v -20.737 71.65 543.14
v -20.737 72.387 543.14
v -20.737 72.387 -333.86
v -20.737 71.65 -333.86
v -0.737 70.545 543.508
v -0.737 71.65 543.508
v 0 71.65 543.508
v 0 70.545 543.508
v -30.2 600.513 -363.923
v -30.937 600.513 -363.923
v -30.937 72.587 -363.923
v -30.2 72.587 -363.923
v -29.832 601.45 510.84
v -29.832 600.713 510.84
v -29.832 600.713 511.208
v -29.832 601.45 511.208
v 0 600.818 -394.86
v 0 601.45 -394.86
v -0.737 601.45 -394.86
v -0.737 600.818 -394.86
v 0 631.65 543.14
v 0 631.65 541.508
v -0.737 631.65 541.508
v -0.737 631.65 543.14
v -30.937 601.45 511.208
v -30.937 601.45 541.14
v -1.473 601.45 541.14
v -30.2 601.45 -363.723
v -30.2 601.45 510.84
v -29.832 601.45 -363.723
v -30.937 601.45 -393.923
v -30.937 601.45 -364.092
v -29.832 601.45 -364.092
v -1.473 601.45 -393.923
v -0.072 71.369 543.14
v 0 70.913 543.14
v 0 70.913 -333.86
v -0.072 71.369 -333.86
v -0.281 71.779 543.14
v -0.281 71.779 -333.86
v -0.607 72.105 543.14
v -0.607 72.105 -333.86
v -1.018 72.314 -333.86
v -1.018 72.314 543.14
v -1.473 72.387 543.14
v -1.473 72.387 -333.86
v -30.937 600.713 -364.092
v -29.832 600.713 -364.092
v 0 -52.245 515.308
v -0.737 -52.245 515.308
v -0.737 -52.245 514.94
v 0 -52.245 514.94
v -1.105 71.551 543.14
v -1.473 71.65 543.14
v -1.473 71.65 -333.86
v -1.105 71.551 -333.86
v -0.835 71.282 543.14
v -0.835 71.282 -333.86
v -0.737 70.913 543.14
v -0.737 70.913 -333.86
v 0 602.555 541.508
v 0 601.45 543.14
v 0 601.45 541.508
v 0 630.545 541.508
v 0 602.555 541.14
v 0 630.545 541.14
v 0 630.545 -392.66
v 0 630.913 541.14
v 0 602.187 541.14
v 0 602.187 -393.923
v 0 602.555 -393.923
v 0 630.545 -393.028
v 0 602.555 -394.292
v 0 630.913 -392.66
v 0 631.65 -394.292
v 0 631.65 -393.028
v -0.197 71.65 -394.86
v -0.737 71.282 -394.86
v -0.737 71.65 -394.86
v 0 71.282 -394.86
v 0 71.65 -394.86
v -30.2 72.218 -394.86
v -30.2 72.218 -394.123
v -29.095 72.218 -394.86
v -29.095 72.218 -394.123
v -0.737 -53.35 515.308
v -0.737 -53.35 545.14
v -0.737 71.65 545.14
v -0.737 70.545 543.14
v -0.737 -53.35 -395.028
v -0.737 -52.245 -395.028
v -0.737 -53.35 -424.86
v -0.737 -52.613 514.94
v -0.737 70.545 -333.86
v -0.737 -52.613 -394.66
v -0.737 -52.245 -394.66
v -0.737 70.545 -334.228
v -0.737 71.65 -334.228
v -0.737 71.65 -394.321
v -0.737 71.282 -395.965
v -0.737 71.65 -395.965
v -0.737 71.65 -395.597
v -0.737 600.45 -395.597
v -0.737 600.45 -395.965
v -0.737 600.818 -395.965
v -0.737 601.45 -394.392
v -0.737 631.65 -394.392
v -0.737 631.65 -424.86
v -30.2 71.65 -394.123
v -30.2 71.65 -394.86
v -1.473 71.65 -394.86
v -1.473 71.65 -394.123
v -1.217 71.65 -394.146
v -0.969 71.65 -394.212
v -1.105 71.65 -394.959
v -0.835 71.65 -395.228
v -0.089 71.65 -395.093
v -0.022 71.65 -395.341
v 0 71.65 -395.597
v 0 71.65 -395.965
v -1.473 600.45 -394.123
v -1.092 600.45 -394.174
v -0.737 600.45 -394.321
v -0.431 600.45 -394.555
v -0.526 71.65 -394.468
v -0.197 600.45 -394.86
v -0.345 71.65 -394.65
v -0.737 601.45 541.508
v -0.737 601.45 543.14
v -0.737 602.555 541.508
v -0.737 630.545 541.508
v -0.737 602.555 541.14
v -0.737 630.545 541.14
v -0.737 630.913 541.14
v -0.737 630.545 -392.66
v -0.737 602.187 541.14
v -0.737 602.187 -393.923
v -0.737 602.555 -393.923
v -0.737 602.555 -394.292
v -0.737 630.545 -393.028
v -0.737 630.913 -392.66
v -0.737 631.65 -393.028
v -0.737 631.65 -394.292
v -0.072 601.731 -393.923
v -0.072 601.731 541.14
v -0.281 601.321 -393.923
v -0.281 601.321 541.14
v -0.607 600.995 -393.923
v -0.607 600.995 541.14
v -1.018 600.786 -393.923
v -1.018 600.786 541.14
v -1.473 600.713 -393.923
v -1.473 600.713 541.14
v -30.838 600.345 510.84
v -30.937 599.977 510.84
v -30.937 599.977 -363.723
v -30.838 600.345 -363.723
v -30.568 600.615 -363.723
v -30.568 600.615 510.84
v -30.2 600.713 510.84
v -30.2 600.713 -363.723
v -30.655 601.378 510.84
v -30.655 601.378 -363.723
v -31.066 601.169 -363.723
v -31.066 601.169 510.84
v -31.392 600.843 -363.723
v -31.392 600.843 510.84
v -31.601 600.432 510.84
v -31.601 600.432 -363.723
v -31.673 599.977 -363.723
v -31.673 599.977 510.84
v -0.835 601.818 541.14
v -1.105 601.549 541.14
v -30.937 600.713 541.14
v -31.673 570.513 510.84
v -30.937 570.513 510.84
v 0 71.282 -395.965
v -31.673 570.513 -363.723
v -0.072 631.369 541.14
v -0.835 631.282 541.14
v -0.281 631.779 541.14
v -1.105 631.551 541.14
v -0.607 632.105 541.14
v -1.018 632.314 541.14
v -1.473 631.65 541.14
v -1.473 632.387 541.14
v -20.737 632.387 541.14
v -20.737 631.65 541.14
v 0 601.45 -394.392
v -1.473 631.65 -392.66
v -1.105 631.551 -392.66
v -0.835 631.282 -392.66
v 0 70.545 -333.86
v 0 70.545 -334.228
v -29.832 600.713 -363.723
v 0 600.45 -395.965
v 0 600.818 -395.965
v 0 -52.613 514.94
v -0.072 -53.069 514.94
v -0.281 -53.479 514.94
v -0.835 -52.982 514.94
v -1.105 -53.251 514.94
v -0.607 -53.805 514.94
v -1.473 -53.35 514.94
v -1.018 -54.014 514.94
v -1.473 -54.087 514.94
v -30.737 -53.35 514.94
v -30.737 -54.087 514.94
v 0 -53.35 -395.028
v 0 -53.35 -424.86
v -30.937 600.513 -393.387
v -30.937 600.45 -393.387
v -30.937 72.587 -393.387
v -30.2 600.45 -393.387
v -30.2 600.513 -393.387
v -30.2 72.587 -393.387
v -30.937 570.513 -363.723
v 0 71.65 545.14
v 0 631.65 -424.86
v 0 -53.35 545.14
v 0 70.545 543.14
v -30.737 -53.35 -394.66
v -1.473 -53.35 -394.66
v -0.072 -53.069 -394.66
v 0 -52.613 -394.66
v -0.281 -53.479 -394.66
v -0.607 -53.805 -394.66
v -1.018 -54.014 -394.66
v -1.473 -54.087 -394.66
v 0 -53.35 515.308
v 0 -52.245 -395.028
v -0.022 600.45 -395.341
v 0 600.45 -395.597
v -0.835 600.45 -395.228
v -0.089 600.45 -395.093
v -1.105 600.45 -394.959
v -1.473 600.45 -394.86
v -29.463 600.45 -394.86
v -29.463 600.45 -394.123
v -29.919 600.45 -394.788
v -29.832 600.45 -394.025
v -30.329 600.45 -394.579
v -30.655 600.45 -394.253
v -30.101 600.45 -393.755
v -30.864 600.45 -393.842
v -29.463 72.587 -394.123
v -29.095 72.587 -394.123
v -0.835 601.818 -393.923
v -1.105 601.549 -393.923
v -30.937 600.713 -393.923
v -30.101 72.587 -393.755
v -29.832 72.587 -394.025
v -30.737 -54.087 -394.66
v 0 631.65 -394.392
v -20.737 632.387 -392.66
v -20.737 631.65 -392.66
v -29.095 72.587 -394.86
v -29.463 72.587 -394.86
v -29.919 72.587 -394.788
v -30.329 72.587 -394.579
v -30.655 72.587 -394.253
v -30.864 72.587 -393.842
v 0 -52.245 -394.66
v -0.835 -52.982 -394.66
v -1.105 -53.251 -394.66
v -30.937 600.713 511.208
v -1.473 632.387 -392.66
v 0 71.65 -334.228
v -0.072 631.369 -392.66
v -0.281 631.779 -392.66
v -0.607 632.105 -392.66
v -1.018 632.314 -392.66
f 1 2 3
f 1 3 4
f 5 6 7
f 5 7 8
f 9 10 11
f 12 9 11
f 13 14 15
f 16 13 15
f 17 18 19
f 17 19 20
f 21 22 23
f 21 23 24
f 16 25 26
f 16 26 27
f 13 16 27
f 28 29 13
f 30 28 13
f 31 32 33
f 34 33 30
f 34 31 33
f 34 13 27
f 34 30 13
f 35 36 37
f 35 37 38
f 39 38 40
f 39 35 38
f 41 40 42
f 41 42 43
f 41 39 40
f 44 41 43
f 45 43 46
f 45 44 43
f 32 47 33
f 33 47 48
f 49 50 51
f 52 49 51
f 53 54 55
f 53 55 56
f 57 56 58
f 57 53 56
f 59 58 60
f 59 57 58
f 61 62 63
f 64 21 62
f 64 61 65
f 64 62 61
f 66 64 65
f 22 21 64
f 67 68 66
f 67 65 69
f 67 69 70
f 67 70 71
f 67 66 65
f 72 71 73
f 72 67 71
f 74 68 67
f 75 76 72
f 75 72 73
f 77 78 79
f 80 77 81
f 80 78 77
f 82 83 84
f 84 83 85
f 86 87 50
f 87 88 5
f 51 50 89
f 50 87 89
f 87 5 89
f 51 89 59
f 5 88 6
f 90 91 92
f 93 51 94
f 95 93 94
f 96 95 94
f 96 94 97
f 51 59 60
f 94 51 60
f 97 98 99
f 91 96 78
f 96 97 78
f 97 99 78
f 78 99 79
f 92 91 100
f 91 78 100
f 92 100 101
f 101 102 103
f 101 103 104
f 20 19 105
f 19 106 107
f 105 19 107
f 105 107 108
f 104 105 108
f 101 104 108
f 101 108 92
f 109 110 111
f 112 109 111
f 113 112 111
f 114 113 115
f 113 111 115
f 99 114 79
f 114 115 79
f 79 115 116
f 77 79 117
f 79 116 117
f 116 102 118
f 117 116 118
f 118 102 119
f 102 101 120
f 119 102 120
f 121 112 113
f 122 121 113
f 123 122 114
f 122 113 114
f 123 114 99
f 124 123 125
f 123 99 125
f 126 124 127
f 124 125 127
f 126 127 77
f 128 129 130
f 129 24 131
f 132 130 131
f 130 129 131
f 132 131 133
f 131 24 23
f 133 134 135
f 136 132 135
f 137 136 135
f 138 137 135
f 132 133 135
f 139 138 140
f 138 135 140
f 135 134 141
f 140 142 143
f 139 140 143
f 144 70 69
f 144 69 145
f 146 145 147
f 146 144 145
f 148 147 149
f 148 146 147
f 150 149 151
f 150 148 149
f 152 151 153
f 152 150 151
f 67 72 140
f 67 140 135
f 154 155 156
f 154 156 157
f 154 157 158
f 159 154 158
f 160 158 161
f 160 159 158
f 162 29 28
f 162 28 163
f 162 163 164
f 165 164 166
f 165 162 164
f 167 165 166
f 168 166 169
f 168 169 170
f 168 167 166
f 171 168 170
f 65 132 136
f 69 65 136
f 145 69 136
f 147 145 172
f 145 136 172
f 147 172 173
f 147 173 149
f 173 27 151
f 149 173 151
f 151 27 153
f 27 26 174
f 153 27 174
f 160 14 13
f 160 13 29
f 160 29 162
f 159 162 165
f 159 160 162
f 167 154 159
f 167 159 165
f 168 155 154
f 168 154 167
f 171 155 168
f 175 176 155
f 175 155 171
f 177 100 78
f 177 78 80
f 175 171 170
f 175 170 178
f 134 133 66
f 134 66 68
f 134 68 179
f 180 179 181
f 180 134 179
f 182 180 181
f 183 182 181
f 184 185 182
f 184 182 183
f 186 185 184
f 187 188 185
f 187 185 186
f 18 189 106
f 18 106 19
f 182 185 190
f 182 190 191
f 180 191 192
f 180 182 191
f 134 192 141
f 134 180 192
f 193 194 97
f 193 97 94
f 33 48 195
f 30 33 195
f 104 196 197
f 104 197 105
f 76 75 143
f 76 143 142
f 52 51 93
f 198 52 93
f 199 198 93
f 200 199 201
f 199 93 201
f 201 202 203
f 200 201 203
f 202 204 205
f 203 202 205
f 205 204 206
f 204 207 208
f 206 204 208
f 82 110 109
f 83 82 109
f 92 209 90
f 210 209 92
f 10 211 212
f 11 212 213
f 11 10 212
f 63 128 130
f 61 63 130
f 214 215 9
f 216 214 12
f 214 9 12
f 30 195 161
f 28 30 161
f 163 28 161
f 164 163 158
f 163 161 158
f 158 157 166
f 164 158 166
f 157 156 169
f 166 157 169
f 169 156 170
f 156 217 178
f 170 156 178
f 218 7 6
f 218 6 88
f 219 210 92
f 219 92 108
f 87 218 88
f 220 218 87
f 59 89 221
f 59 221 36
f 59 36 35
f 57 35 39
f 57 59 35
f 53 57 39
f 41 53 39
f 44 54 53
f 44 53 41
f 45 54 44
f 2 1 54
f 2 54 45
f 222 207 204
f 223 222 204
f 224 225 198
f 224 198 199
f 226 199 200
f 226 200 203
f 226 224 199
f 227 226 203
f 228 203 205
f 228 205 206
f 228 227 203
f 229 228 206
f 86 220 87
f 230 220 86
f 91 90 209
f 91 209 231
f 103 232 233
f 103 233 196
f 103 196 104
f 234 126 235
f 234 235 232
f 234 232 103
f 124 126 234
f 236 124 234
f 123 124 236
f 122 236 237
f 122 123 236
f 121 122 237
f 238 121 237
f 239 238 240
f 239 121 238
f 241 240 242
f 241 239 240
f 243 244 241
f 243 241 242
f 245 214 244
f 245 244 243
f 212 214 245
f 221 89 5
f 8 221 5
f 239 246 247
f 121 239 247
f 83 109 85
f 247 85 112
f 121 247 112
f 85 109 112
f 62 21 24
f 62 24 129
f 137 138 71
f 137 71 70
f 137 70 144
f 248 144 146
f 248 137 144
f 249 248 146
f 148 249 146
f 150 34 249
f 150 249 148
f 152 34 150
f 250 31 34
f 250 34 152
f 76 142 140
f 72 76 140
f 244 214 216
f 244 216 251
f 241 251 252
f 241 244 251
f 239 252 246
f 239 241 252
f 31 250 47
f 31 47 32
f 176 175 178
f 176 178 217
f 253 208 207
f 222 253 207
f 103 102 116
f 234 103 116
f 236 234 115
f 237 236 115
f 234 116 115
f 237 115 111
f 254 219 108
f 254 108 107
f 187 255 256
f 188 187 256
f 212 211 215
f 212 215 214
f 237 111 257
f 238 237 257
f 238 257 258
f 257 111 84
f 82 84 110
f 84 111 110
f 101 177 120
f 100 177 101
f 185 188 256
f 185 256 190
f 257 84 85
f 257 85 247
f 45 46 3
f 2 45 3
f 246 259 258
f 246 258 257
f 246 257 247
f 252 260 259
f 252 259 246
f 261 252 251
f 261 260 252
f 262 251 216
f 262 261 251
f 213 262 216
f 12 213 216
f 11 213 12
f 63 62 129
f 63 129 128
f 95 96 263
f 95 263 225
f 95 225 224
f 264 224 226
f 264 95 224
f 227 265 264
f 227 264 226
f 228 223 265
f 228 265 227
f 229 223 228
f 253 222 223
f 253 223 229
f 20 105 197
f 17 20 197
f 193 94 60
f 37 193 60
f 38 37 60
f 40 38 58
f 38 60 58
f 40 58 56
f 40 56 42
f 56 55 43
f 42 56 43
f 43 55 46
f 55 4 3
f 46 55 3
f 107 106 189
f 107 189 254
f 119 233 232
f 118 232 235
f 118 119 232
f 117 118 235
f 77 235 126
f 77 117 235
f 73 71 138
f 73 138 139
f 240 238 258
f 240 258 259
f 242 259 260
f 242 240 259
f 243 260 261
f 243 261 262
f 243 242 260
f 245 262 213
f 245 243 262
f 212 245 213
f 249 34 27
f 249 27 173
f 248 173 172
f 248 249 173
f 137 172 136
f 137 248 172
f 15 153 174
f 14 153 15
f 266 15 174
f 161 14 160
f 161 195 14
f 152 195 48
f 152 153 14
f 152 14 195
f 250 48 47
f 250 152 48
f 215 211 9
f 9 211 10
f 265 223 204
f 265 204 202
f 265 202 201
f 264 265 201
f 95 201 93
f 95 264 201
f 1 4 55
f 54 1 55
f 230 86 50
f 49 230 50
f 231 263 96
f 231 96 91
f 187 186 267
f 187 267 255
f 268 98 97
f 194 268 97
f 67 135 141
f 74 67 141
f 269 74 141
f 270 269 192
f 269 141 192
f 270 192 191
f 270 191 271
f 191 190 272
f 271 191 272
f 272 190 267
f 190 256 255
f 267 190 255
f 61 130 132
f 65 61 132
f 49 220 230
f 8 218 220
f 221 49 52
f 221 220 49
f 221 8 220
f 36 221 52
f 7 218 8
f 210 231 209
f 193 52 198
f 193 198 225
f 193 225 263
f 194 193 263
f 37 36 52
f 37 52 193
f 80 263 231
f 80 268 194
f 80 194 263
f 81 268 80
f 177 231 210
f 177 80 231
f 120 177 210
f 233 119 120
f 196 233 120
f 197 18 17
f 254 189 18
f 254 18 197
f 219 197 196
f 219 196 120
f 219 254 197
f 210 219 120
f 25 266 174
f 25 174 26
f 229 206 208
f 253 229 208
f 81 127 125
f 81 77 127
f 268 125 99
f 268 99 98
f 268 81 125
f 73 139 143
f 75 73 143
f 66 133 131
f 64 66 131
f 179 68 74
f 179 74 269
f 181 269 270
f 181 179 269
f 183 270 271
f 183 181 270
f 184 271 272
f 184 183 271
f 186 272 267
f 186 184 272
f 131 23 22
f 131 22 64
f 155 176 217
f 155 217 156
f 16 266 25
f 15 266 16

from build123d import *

# Parameters (mm, degrees)
BASE_FLANGE1_DEPTH             = 0.7366
EDGE_FLANGE1_STRIP_W           = 4.4196
EDGE_FLANGE1_STRIP_H           = 0.7366
EDGE_FLANGE1_STRIP_CUT_DEPTH   = 877
EDGE_FLANGE1_RELIEF_W          = 4.7879
EDGE_FLANGE1_RELIEF_H          = 0.3683
EDGE_FLANGE1_RELIEF_CUT_DEPTH  = 0.7366
EDGE_FLANGE1_DEPTH             = 877
EDGE_FLANGE2_START             = 71.2817
EDGE_FLANGE2_DEPTH             = 529.5366
EDGE_FLANGE2_2_DEPTH           = 0.3683
EDGE_FLANGE2_START_2           = 600.45
EDGE_FLANGE2_3_DEPTH           = 0.3683
EDGE_FLANGE2_START_3           = 71.65
EDGE_FLANGE2_4_DEPTH           = 528.8
EDGE_FLANGE3_STRIP_W           = 4.4196
EDGE_FLANGE3_STRIP_H           = 0.7366
EDGE_FLANGE3_STRIP_CUT_DEPTH   = 935.0634
EDGE_FLANGE3_RELIEF_W          = 4.7879
EDGE_FLANGE3_RELIEF_H          = 0.3683
EDGE_FLANGE3_RELIEF_CUT_DEPTH  = 0.7366
EDGE_FLANGE3_DEPTH             = 935.0634
EDGE_FLANGE4_STRIP_W           = 4.4196
EDGE_FLANGE4_STRIP_H           = 0.7366
EDGE_FLANGE4_STRIP_CUT_DEPTH   = 933.8
EDGE_FLANGE4_RELIEF_W          = 4.7879
EDGE_FLANGE4_RELIEF_H          = 0.3683
EDGE_FLANGE4_RELIEF_CUT_DEPTH  = 0.7366
EDGE_FLANGE4_DEPTH             = 933.8
EDGE_FLANGE10_STRIP_W          = 4.4196
EDGE_FLANGE10_STRIP_H          = 0.7366
EDGE_FLANGE10_STRIP_CUT_DEPTH  = 874.5634
EDGE_FLANGE10_RELIEF_W         = 4.7879
EDGE_FLANGE10_RELIEF_H         = 0.3683
EDGE_FLANGE10_RELIEF_CUT_DEPTH = 0.7366
EDGE_FLANGE10_DEPTH            = 874.5634
EDGE_FLANGE11_STRIP_W          = 4.4196
EDGE_FLANGE11_STRIP_H          = 0.7366
EDGE_FLANGE11_STRIP_CUT_DEPTH  = 527.8634
EDGE_FLANGE11_RELIEF_W         = 4.7879
EDGE_FLANGE11_RELIEF_H         = 0.3683
EDGE_FLANGE11_RELIEF_CUT_DEPTH = 0.7366
EDGE_FLANGE11_DEPTH            = 527.8634
EDGE_FLANGE11_START            = 0.7366
EDGE_FLANGE11_PROFILE_W        = 527.9268
EDGE_FLANGE11_PROFILE_H        = 29.4634
EDGE_FLANGE11_FLAT_DEPTH       = 0.7366
EDGE_FLANGE13_STRIP_W          = 4.4196
EDGE_FLANGE13_STRIP_H          = 0.7366
EDGE_FLANGE13_STRIP_CUT_DEPTH  = 909.6
EDGE_FLANGE13_RELIEF_W         = 4.7879
EDGE_FLANGE13_RELIEF_H         = 0.3683
EDGE_FLANGE13_RELIEF_CUT_DEPTH = 0.7366
EDGE_FLANGE13_DEPTH            = 909.6
SKETCH44_W                     = 0.1
SKETCH44_H                     = 30.2
CUT_EXTRUDE16_DEPTH            = 91


with BuildPart() as part:
    # Base-Flange1: sheet metal written as solids
    # Sketch1 → Base-Flange1 (new body)
    with BuildSketch(Plane(origin=(0, 0, 0), x_dir=(0, 0, -1), z_dir=(1, 0, 0))):
        Polygon((-545.14, 71.65), (-545.14, -53.35), (424.86, -53.35), (424.86, 631.65), (-543.14, 631.65), (-543.14, 601.45), (394.86, 601.45), (394.86, 71.65), align=None)
    extrude(amount=-BASE_FLANGE1_DEPTH)

    # Edge-Flange1: sheet metal written as solids
    # Edge-Flange1 strip (on a plane across the edge) → Edge-Flange1 strip cut (cut)
    with BuildSketch(Plane(origin=(-0.7366, 71.65, 543.14), x_dir=(0, -1, 0), z_dir=(0, 0, -1))):
        with Locations((-1.4732, -0.3683)):
            Rectangle(EDGE_FLANGE1_STRIP_W, EDGE_FLANGE1_STRIP_H)
    extrude(amount=EDGE_FLANGE1_STRIP_CUT_DEPTH, mode=Mode.SUBTRACT)

    # Edge-Flange1 relief (on the sheet) → Edge-Flange1 relief cut (cut)
    with BuildSketch(Plane(origin=(-0.7366, 70.9134, 543.14), x_dir=(0, -1, 0), z_dir=(-1, 0, 0))):
        with Locations((-2.02565, 0.18415)):
            Rectangle(EDGE_FLANGE1_RELIEF_W, EDGE_FLANGE1_RELIEF_H)
        with Locations((-2.02565, -877.18415)):
            Rectangle(EDGE_FLANGE1_RELIEF_W, EDGE_FLANGE1_RELIEF_H)
    extrude(amount=-EDGE_FLANGE1_RELIEF_CUT_DEPTH, mode=Mode.SUBTRACT)

    # Edge-Flange1 section (on a plane across the edge) → Edge-Flange1 (add)
    with BuildSketch(Plane(origin=(-0.7366, 71.65, 543.14), x_dir=(0, -1, 0), z_dir=(0, 0, -1))):
        with BuildLine():
            Line((-0.7366, 0.7366), (-0.7366, 20))
            Line((-0.7366, 20), (0, 20))
            Line((0, 20), (0, 0.7366))
            ThreePointArc((0, 0.7366), (0.215745145, 0.215745145), (0.7366, 0))
            Line((0.7366, 0), (0.7366, -0.7366))
            ThreePointArc((0.7366, -0.7366), (-0.30510971, -0.30510971), (-0.7366, 0.7366))
        make_face()
    extrude(amount=EDGE_FLANGE1_DEPTH)

    # Edge-Flange2: read off the stored shape, not the designer's step
    # Edge-Flange2 outline → Edge-Flange2 (cut)
    with BuildSketch(Plane(origin=(0, 0, 0), x_dir=(1, 0, 0), z_dir=(0, 1, 0)).offset(EDGE_FLANGE2_START)):
        with BuildLine():
            Line((0, 394.86), (0, 395.5966))
            ThreePointArc((0, 395.5966), (-0.050198073, 395.215307783), (-0.197371375, 394.86))
            Line((-0.197371375, 394.86), (0, 394.86))
        make_face()
    extrude(amount=EDGE_FLANGE2_DEPTH, mode=Mode.SUBTRACT)

    # Edge-Flange2 2 outline → Edge-Flange2 2 (cut)
    with BuildSketch(Plane(origin=(0, 0, 0), x_dir=(1, 0, 0), z_dir=(0, 1, 0)).offset(EDGE_FLANGE2_START)):
        with BuildLine():
            Line((0, 395.5966), (0, 395.9649))
            Line((0, 395.9649), (-0.7366, 395.9649))
            Line((-0.7366, 395.9649), (-0.7366, 394.86))
            Line((-0.7366, 394.86), (-0.197371375, 394.86))
            ThreePointArc((-0.197371375, 394.86), (-0.050198073, 395.215307783), (0, 395.5966))
        make_face()
    extrude(amount=EDGE_FLANGE2_2_DEPTH, mode=Mode.SUBTRACT)

    # Edge-Flange2 3 outline → Edge-Flange2 3 (cut)
    with BuildSketch(Plane(origin=(0, 0, 0), x_dir=(1, 0, 0), z_dir=(0, 1, 0)).offset(EDGE_FLANGE2_START_2)):
        with BuildLine():
            Line((0, 395.5966), (0, 395.9649))
            Line((0, 395.9649), (-0.7366, 395.9649))
            Line((-0.7366, 395.9649), (-0.7366, 394.86))
            Line((-0.7366, 394.86), (-0.197371375, 394.86))
            ThreePointArc((-0.197371375, 394.86), (-0.050198073, 395.215307783), (0, 395.5966))
        make_face()
    extrude(amount=EDGE_FLANGE2_3_DEPTH, mode=Mode.SUBTRACT)

    # Edge-Flange2 4 outline → Edge-Flange2 4 (add)
    with BuildSketch(Plane(origin=(0, 0, 0), x_dir=(1, 0, 0), z_dir=(0, 1, 0)).offset(EDGE_FLANGE2_START_3)):
        with BuildLine():
            Line((-0.7366, 394.86), (-0.7366, 395.5966))
            ThreePointArc((-0.7366, 395.5966), (-0.952345145, 395.075745145), (-1.4732, 394.86))
            Line((-1.4732, 394.86), (-30.2, 394.86))
            Line((-30.2, 394.86), (-30.2, 394.1234))
            Line((-30.2, 394.1234), (-1.4732, 394.1234))
            ThreePointArc((-1.4732, 394.1234), (-0.7366, 394.320771375), (-0.197371375, 394.86))
            Line((-0.197371375, 394.86), (-0.7366, 394.86))
        make_face()
    extrude(amount=EDGE_FLANGE2_4_DEPTH)

    # Edge-Flange3: sheet metal written as solids
    # Edge-Flange3 strip (on a plane across the edge) → Edge-Flange3 strip cut (cut)
    with BuildSketch(Plane(origin=(-0.7366, 601.45, -393.9234), x_dir=(0, 1, 0), z_dir=(0, 0, 1))):
        with Locations((-1.4732, -0.3683)):
            Rectangle(EDGE_FLANGE3_STRIP_W, EDGE_FLANGE3_STRIP_H)
    extrude(amount=EDGE_FLANGE3_STRIP_CUT_DEPTH, mode=Mode.SUBTRACT)

    # Edge-Flange3 relief (on the sheet) → Edge-Flange3 relief cut (cut)
    with BuildSketch(Plane(origin=(-0.7366, 602.1866, -393.9234), x_dir=(0, 1, 0), z_dir=(-1, 0, 0))):
        with Locations((-2.02565, 0.18415)):
            Rectangle(EDGE_FLANGE3_RELIEF_W, EDGE_FLANGE3_RELIEF_H)
        with Locations((-2.02565, -935.24755)):
            Rectangle(EDGE_FLANGE3_RELIEF_W, EDGE_FLANGE3_RELIEF_H)
    extrude(amount=-EDGE_FLANGE3_RELIEF_CUT_DEPTH, mode=Mode.SUBTRACT)

    # Edge-Flange3 section (on a plane across the edge) → Edge-Flange3 (add)
    with BuildSketch(Plane(origin=(-0.7366, 601.45, -393.9234), x_dir=(0, 1, 0), z_dir=(0, 0, 1))):
        with BuildLine():
            Line((-0.7366, 0.7366), (-0.7366, 30.2))
            Line((-0.7366, 30.2), (0, 30.2))
            Line((0, 30.2), (0, 0.7366))
            ThreePointArc((0, 0.7366), (0.215745145, 0.215745145), (0.7366, 0))
            Line((0.7366, 0), (0.7366, -0.7366))
            ThreePointArc((0.7366, -0.7366), (-0.30510971, -0.30510971), (-0.7366, 0.7366))
        make_face()
    extrude(amount=EDGE_FLANGE3_DEPTH)

    # Edge-Flange4: sheet metal written as solids
    # Edge-Flange4 strip (on a plane across the edge) → Edge-Flange4 strip cut (cut)
    with BuildSketch(Plane(origin=(-0.7366, 631.65, 541.14), x_dir=(0, -1, 0), z_dir=(0, 0, -1))):
        with Locations((-1.4732, -0.3683)):
            Rectangle(EDGE_FLANGE4_STRIP_W, EDGE_FLANGE4_STRIP_H)
    extrude(amount=EDGE_FLANGE4_STRIP_CUT_DEPTH, mode=Mode.SUBTRACT)

    # Edge-Flange4 relief (on the sheet) → Edge-Flange4 relief cut (cut)
    with BuildSketch(Plane(origin=(-0.7366, 630.9134, 541.14), x_dir=(0, -1, 0), z_dir=(-1, 0, 0))):
        with Locations((-2.02565, 0.18415)):
            Rectangle(EDGE_FLANGE4_RELIEF_W, EDGE_FLANGE4_RELIEF_H)
        with Locations((-2.02565, -933.98415)):
            Rectangle(EDGE_FLANGE4_RELIEF_W, EDGE_FLANGE4_RELIEF_H)
    extrude(amount=-EDGE_FLANGE4_RELIEF_CUT_DEPTH, mode=Mode.SUBTRACT)

    # Edge-Flange4 section (on a plane across the edge) → Edge-Flange4 (add)
    with BuildSketch(Plane(origin=(-0.7366, 631.65, 541.14), x_dir=(0, -1, 0), z_dir=(0, 0, -1))):
        with BuildLine():
            Line((-0.7366, 0.7366), (-0.7366, 20))
            Line((-0.7366, 20), (0, 20))
            Line((0, 20), (0, 0.7366))
            ThreePointArc((0, 0.7366), (0.215745145, 0.215745145), (0.7366, 0))
            Line((0.7366, 0), (0.7366, -0.7366))
            ThreePointArc((0.7366, -0.7366), (-0.30510971, -0.30510971), (-0.7366, 0.7366))
        make_face()
    extrude(amount=EDGE_FLANGE4_DEPTH)

    # Edge-Flange10: sheet metal written as solids
    # Edge-Flange10 strip (on a plane across the edge) → Edge-Flange10 strip cut (cut)
    with BuildSketch(Plane(origin=(-30.9366, 600.7134, 510.84), x_dir=(1, 0, 0), z_dir=(0, 0, -1))):
        with Locations((-1.4732, -0.3683)):
            Rectangle(EDGE_FLANGE10_STRIP_W, EDGE_FLANGE10_STRIP_H)
    extrude(amount=EDGE_FLANGE10_STRIP_CUT_DEPTH, mode=Mode.SUBTRACT)

    # Edge-Flange10 relief (on the sheet) → Edge-Flange10 relief cut (cut)
    with BuildSketch(Plane(origin=(-30.2, 600.7134, 510.84), x_dir=(1, 0, 0), z_dir=(0, -1, 0))):
        with Locations((-2.02565, 0.18415)):
            Rectangle(EDGE_FLANGE10_RELIEF_W, EDGE_FLANGE10_RELIEF_H)
        with Locations((-2.02565, -874.74755)):
            Rectangle(EDGE_FLANGE10_RELIEF_W, EDGE_FLANGE10_RELIEF_H)
    extrude(amount=-EDGE_FLANGE10_RELIEF_CUT_DEPTH, mode=Mode.SUBTRACT)

    # Edge-Flange10 section (on a plane across the edge) → Edge-Flange10 (add)
    with BuildSketch(Plane(origin=(-30.9366, 600.7134, 510.84), x_dir=(1, 0, 0), z_dir=(0, 0, -1))):
        with BuildLine():
            Line((-0.7366, 0.7366), (-0.7366, 30.2))
            Line((-0.7366, 30.2), (0, 30.2))
            Line((0, 30.2), (0, 0.7366))
            ThreePointArc((0, 0.7366), (0.215745145, 0.215745145), (0.7366, 0))
            Line((0.7366, 0), (0.7366, -0.7366))
            ThreePointArc((0.7366, -0.7366), (-0.30510971, -0.30510971), (-0.7366, 0.7366))
        make_face()
    extrude(amount=EDGE_FLANGE10_DEPTH)

    # Edge-Flange11: sheet metal written as solids
    # Edge-Flange11 strip (on a plane across the edge) → Edge-Flange11 strip cut (cut)
    with BuildSketch(Plane(origin=(-30.2, 600.45, -394.1234), x_dir=(1, 0, 0), z_dir=(0, -1, 0))):
        with Locations((-1.4732, -0.3683)):
            Rectangle(EDGE_FLANGE11_STRIP_W, EDGE_FLANGE11_STRIP_H)
    extrude(amount=EDGE_FLANGE11_STRIP_CUT_DEPTH, mode=Mode.SUBTRACT)

    # Edge-Flange11 relief (on the sheet) → Edge-Flange11 relief cut (cut)
    with BuildSketch(Plane(origin=(-29.4634, 600.45, -394.1234), x_dir=(1, 0, 0), z_dir=(0, 0, 1))):
        with Locations((-2.02565, -528.04755)):
            Rectangle(EDGE_FLANGE11_RELIEF_W, EDGE_FLANGE11_RELIEF_H)
    extrude(amount=-EDGE_FLANGE11_RELIEF_CUT_DEPTH, mode=Mode.SUBTRACT)

    # Edge-Flange11 bend section (on a plane across the edge) → Edge-Flange11 (add)
    with BuildSketch(Plane(origin=(-30.2, 600.45, -394.1234), x_dir=(1, 0, 0), z_dir=(0, -1, 0))):
        with BuildLine():
            Line((-0.7366, 0.7366), (0, 0.7366))
            ThreePointArc((0, 0.7366), (0.215745145, 0.215745145), (0.7366, 0))
            Line((0.7366, 0), (0.7366, -0.7366))
            ThreePointArc((0.7366, -0.7366), (-0.30510971, -0.30510971), (-0.7366, 0.7366))
        make_face()
    extrude(amount=EDGE_FLANGE11_DEPTH)

    # Edge-Flange11 profile (on flange) → Edge-Flange11 flat (add)
    with BuildSketch(Plane(origin=(-30.2, 0, -394.1234), x_dir=(0, -1, 0), z_dir=(-1, 0, 0)).offset(EDGE_FLANGE11_START)):
        with Locations((-336.55, 15.4683)):
            Rectangle(EDGE_FLANGE11_PROFILE_W, EDGE_FLANGE11_PROFILE_H)
    extrude(amount=-EDGE_FLANGE11_FLAT_DEPTH)

    # Edge-Flange13: sheet metal written as solids
    # Edge-Flange13 strip (on a plane across the edge) → Edge-Flange13 strip cut (cut)
    with BuildSketch(Plane(origin=(-0.7366, -53.35, -394.66), x_dir=(0, 1, 0), z_dir=(0, 0, 1))):
        with Locations((-1.4732, -0.3683)):
            Rectangle(EDGE_FLANGE13_STRIP_W, EDGE_FLANGE13_STRIP_H)
    extrude(amount=EDGE_FLANGE13_STRIP_CUT_DEPTH, mode=Mode.SUBTRACT)

    # Edge-Flange13 relief (on the sheet) → Edge-Flange13 relief cut (cut)
    with BuildSketch(Plane(origin=(-0.7366, -52.6134, -394.66), x_dir=(0, 1, 0), z_dir=(-1, 0, 0))):
        with Locations((-2.02565, 0.18415)):
            Rectangle(EDGE_FLANGE13_RELIEF_W, EDGE_FLANGE13_RELIEF_H)
        with Locations((-2.02565, -909.78415)):
            Rectangle(EDGE_FLANGE13_RELIEF_W, EDGE_FLANGE13_RELIEF_H)
    extrude(amount=-EDGE_FLANGE13_RELIEF_CUT_DEPTH, mode=Mode.SUBTRACT)

    # Edge-Flange13 section (on a plane across the edge) → Edge-Flange13 (add)
    with BuildSketch(Plane(origin=(-0.7366, -53.35, -394.66), x_dir=(0, 1, 0), z_dir=(0, 0, 1))):
        with BuildLine():
            Line((-0.7366, 0.7366), (-0.7366, 30))
            Line((-0.7366, 30), (0, 30))
            Line((0, 30), (0, 0.7366))
            ThreePointArc((0, 0.7366), (0.215745145, 0.215745145), (0.7366, 0))
            Line((0.7366, 0), (0.7366, -0.7366))
            ThreePointArc((0.7366, -0.7366), (-0.30510971, -0.30510971), (-0.7366, 0.7366))
        make_face()
    extrude(amount=EDGE_FLANGE13_DEPTH)

    # Sketch44 → Cut-Extrude16 (cut)
    with BuildSketch(Plane.ZY.offset(0.7366)):
        with Locations((-394.3417, 616.55)):
            Rectangle(SKETCH44_W, SKETCH44_H)
    extrude(amount=-CUT_EXTRUDE16_DEPTH, mode=Mode.SUBTRACT)


with BuildPart() as cut_extrude16_piece_1:
    # of the separate pieces the step leaves, piece 1, a body of its own (cut_extrude16_pieces)
    add(part.part.solids().sort_by_distance((0, 71.65, 545.14))[0])


with BuildPart() as cut_extrude16_piece_2:
    # of the separate pieces the step leaves, piece 2, a body of its own (cut_extrude16_pieces)
    add(part.part.solids().sort_by_distance((0, 602.5549, -393.9234))[0])


solid = Compound([cut_extrude16_piece_1.part, cut_extrude16_piece_2.part])
